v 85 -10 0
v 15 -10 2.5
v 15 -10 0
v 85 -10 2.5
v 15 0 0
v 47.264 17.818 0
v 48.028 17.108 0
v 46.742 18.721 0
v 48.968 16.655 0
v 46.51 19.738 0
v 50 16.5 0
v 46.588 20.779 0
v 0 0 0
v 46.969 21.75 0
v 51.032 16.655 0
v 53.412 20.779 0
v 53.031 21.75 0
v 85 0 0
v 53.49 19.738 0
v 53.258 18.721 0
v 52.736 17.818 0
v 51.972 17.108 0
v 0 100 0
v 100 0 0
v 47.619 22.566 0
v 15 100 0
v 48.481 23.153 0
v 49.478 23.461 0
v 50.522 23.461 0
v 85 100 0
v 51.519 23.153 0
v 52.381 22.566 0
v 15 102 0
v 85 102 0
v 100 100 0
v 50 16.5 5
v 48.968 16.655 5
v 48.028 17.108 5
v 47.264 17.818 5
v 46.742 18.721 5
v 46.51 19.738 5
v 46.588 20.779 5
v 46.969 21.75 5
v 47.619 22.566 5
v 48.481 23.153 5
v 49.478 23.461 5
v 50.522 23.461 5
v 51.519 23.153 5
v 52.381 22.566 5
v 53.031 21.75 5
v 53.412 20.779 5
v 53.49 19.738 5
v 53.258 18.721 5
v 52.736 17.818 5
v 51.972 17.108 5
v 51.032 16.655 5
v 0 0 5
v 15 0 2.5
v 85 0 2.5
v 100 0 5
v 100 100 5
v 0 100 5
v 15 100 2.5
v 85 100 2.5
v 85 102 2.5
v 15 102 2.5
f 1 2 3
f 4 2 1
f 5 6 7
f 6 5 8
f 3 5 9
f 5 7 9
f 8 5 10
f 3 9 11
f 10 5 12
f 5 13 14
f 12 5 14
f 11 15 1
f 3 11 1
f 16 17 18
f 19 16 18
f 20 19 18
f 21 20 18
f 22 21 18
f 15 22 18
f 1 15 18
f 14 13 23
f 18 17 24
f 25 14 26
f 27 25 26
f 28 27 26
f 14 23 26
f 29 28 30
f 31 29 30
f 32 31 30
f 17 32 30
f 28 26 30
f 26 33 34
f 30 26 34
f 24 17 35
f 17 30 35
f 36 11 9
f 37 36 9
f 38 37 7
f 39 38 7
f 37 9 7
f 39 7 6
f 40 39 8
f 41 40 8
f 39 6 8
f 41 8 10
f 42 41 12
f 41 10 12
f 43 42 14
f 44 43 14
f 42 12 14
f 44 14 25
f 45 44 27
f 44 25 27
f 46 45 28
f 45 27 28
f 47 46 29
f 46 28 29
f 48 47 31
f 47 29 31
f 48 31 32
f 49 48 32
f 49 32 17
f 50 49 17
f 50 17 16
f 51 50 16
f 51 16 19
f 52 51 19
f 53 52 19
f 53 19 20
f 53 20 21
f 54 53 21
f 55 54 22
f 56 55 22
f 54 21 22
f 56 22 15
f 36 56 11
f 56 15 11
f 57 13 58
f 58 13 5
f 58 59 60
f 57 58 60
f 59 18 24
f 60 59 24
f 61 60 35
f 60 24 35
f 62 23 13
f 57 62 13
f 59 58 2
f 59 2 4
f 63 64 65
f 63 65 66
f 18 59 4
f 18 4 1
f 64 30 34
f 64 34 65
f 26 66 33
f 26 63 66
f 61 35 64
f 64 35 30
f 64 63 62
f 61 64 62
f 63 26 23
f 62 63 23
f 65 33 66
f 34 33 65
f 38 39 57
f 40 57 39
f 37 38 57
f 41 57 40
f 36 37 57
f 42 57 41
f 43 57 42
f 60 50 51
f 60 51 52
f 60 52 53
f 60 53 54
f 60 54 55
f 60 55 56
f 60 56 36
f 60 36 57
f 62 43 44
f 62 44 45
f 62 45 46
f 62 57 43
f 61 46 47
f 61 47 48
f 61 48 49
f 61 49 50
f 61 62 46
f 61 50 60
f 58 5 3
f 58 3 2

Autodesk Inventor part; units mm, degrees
ref_plane "YZ Plane" through (0, 0, 0) normal (1, 0, 0) x (0, 1, 0)
ref_plane "XZ Plane" through (0, 0, 0) normal (0, 1, 0) x (-1, 0, 0)
ref_plane "XY Plane" through (0, 0, 0) normal (0, 0, 1) x (1, 0, 0)
sketch "スケッチ1" plane through (0, 0, 0) normal (0, 0, 1) x (1, 0, 0)
  line L0 (0, 0) -> (100, 0)
  line L1 (100, 0) -> (100, 100)
  line L2 (100, 100) -> (0, 100)
  line L3 (0, 100) -> (0, 0)
  dimension "d0" = 100
  dimension "d1" = 100
extrude "押し出し1" add sketch "スケッチ1" along normal blind 5
sketch "スケッチ2" plane through (0, 0, 0) normal (0, -1, 0) x (1, 0, 0)
  line L0 (100, 5) -> (0, 5) projected
  line L1 (50, 5) -> (50, 0) construction
  line L2 (100, 0) -> (0, 0) projected
  line L3 (85, 0) -> (15, 0)
  line L4 (15, 0) -> (15, 2.5)
  line L5 (15, 2.5) -> (85, 2.5)
  line L6 (85, 2.5) -> (85, 0)
  point P0 (15, 0)
  dimension "d4" = 70
  dimension "d5" = 2.5
extrude "押し出し2" add sketch "スケッチ2" along normal blind 10
sketch "スケッチ3" plane through (0, 0, 5) normal (0, 0, 1) x (1, 0, 0)
  line L0 (100, 100) -> (0, 100) projected
  line L1 (50, 100) -> (50, 0) construction
  line L2 (15, 0) -> (85, 0) projected
  point P0 (0, 0)
  point P1 (50, 20)
  dimension "d15" = 20
hole "穴1" at (50, 20, 5) direction (0, 0, -1) diameter 7 end through all
sketch "スケッチ5" plane through (0, 100, 0) normal (0, 1, 0) x (1, 0, 0)
  line L0 (53.5, -5) -> (46.5, -5) projected
  line L1 (50, -5) -> (50, 0) construction
  line L2 (46.5, 0) -> (53.5, 0) projected
  line L3 (100, 0) -> (0, 0) projected
  line L4 (15, 0) -> (85, 0)
  line L5 (85, 0) -> (85, -2.5)
  line L6 (85, -2.5) -> (15, -2.5)
  line L7 (15, -2.5) -> (15, 0)
  dimension "d25" = 2.5
  dimension "d26" = 70
extrude "押し出し3" add sketch "スケッチ5" along normal blind 2
properties part number "body_right"
